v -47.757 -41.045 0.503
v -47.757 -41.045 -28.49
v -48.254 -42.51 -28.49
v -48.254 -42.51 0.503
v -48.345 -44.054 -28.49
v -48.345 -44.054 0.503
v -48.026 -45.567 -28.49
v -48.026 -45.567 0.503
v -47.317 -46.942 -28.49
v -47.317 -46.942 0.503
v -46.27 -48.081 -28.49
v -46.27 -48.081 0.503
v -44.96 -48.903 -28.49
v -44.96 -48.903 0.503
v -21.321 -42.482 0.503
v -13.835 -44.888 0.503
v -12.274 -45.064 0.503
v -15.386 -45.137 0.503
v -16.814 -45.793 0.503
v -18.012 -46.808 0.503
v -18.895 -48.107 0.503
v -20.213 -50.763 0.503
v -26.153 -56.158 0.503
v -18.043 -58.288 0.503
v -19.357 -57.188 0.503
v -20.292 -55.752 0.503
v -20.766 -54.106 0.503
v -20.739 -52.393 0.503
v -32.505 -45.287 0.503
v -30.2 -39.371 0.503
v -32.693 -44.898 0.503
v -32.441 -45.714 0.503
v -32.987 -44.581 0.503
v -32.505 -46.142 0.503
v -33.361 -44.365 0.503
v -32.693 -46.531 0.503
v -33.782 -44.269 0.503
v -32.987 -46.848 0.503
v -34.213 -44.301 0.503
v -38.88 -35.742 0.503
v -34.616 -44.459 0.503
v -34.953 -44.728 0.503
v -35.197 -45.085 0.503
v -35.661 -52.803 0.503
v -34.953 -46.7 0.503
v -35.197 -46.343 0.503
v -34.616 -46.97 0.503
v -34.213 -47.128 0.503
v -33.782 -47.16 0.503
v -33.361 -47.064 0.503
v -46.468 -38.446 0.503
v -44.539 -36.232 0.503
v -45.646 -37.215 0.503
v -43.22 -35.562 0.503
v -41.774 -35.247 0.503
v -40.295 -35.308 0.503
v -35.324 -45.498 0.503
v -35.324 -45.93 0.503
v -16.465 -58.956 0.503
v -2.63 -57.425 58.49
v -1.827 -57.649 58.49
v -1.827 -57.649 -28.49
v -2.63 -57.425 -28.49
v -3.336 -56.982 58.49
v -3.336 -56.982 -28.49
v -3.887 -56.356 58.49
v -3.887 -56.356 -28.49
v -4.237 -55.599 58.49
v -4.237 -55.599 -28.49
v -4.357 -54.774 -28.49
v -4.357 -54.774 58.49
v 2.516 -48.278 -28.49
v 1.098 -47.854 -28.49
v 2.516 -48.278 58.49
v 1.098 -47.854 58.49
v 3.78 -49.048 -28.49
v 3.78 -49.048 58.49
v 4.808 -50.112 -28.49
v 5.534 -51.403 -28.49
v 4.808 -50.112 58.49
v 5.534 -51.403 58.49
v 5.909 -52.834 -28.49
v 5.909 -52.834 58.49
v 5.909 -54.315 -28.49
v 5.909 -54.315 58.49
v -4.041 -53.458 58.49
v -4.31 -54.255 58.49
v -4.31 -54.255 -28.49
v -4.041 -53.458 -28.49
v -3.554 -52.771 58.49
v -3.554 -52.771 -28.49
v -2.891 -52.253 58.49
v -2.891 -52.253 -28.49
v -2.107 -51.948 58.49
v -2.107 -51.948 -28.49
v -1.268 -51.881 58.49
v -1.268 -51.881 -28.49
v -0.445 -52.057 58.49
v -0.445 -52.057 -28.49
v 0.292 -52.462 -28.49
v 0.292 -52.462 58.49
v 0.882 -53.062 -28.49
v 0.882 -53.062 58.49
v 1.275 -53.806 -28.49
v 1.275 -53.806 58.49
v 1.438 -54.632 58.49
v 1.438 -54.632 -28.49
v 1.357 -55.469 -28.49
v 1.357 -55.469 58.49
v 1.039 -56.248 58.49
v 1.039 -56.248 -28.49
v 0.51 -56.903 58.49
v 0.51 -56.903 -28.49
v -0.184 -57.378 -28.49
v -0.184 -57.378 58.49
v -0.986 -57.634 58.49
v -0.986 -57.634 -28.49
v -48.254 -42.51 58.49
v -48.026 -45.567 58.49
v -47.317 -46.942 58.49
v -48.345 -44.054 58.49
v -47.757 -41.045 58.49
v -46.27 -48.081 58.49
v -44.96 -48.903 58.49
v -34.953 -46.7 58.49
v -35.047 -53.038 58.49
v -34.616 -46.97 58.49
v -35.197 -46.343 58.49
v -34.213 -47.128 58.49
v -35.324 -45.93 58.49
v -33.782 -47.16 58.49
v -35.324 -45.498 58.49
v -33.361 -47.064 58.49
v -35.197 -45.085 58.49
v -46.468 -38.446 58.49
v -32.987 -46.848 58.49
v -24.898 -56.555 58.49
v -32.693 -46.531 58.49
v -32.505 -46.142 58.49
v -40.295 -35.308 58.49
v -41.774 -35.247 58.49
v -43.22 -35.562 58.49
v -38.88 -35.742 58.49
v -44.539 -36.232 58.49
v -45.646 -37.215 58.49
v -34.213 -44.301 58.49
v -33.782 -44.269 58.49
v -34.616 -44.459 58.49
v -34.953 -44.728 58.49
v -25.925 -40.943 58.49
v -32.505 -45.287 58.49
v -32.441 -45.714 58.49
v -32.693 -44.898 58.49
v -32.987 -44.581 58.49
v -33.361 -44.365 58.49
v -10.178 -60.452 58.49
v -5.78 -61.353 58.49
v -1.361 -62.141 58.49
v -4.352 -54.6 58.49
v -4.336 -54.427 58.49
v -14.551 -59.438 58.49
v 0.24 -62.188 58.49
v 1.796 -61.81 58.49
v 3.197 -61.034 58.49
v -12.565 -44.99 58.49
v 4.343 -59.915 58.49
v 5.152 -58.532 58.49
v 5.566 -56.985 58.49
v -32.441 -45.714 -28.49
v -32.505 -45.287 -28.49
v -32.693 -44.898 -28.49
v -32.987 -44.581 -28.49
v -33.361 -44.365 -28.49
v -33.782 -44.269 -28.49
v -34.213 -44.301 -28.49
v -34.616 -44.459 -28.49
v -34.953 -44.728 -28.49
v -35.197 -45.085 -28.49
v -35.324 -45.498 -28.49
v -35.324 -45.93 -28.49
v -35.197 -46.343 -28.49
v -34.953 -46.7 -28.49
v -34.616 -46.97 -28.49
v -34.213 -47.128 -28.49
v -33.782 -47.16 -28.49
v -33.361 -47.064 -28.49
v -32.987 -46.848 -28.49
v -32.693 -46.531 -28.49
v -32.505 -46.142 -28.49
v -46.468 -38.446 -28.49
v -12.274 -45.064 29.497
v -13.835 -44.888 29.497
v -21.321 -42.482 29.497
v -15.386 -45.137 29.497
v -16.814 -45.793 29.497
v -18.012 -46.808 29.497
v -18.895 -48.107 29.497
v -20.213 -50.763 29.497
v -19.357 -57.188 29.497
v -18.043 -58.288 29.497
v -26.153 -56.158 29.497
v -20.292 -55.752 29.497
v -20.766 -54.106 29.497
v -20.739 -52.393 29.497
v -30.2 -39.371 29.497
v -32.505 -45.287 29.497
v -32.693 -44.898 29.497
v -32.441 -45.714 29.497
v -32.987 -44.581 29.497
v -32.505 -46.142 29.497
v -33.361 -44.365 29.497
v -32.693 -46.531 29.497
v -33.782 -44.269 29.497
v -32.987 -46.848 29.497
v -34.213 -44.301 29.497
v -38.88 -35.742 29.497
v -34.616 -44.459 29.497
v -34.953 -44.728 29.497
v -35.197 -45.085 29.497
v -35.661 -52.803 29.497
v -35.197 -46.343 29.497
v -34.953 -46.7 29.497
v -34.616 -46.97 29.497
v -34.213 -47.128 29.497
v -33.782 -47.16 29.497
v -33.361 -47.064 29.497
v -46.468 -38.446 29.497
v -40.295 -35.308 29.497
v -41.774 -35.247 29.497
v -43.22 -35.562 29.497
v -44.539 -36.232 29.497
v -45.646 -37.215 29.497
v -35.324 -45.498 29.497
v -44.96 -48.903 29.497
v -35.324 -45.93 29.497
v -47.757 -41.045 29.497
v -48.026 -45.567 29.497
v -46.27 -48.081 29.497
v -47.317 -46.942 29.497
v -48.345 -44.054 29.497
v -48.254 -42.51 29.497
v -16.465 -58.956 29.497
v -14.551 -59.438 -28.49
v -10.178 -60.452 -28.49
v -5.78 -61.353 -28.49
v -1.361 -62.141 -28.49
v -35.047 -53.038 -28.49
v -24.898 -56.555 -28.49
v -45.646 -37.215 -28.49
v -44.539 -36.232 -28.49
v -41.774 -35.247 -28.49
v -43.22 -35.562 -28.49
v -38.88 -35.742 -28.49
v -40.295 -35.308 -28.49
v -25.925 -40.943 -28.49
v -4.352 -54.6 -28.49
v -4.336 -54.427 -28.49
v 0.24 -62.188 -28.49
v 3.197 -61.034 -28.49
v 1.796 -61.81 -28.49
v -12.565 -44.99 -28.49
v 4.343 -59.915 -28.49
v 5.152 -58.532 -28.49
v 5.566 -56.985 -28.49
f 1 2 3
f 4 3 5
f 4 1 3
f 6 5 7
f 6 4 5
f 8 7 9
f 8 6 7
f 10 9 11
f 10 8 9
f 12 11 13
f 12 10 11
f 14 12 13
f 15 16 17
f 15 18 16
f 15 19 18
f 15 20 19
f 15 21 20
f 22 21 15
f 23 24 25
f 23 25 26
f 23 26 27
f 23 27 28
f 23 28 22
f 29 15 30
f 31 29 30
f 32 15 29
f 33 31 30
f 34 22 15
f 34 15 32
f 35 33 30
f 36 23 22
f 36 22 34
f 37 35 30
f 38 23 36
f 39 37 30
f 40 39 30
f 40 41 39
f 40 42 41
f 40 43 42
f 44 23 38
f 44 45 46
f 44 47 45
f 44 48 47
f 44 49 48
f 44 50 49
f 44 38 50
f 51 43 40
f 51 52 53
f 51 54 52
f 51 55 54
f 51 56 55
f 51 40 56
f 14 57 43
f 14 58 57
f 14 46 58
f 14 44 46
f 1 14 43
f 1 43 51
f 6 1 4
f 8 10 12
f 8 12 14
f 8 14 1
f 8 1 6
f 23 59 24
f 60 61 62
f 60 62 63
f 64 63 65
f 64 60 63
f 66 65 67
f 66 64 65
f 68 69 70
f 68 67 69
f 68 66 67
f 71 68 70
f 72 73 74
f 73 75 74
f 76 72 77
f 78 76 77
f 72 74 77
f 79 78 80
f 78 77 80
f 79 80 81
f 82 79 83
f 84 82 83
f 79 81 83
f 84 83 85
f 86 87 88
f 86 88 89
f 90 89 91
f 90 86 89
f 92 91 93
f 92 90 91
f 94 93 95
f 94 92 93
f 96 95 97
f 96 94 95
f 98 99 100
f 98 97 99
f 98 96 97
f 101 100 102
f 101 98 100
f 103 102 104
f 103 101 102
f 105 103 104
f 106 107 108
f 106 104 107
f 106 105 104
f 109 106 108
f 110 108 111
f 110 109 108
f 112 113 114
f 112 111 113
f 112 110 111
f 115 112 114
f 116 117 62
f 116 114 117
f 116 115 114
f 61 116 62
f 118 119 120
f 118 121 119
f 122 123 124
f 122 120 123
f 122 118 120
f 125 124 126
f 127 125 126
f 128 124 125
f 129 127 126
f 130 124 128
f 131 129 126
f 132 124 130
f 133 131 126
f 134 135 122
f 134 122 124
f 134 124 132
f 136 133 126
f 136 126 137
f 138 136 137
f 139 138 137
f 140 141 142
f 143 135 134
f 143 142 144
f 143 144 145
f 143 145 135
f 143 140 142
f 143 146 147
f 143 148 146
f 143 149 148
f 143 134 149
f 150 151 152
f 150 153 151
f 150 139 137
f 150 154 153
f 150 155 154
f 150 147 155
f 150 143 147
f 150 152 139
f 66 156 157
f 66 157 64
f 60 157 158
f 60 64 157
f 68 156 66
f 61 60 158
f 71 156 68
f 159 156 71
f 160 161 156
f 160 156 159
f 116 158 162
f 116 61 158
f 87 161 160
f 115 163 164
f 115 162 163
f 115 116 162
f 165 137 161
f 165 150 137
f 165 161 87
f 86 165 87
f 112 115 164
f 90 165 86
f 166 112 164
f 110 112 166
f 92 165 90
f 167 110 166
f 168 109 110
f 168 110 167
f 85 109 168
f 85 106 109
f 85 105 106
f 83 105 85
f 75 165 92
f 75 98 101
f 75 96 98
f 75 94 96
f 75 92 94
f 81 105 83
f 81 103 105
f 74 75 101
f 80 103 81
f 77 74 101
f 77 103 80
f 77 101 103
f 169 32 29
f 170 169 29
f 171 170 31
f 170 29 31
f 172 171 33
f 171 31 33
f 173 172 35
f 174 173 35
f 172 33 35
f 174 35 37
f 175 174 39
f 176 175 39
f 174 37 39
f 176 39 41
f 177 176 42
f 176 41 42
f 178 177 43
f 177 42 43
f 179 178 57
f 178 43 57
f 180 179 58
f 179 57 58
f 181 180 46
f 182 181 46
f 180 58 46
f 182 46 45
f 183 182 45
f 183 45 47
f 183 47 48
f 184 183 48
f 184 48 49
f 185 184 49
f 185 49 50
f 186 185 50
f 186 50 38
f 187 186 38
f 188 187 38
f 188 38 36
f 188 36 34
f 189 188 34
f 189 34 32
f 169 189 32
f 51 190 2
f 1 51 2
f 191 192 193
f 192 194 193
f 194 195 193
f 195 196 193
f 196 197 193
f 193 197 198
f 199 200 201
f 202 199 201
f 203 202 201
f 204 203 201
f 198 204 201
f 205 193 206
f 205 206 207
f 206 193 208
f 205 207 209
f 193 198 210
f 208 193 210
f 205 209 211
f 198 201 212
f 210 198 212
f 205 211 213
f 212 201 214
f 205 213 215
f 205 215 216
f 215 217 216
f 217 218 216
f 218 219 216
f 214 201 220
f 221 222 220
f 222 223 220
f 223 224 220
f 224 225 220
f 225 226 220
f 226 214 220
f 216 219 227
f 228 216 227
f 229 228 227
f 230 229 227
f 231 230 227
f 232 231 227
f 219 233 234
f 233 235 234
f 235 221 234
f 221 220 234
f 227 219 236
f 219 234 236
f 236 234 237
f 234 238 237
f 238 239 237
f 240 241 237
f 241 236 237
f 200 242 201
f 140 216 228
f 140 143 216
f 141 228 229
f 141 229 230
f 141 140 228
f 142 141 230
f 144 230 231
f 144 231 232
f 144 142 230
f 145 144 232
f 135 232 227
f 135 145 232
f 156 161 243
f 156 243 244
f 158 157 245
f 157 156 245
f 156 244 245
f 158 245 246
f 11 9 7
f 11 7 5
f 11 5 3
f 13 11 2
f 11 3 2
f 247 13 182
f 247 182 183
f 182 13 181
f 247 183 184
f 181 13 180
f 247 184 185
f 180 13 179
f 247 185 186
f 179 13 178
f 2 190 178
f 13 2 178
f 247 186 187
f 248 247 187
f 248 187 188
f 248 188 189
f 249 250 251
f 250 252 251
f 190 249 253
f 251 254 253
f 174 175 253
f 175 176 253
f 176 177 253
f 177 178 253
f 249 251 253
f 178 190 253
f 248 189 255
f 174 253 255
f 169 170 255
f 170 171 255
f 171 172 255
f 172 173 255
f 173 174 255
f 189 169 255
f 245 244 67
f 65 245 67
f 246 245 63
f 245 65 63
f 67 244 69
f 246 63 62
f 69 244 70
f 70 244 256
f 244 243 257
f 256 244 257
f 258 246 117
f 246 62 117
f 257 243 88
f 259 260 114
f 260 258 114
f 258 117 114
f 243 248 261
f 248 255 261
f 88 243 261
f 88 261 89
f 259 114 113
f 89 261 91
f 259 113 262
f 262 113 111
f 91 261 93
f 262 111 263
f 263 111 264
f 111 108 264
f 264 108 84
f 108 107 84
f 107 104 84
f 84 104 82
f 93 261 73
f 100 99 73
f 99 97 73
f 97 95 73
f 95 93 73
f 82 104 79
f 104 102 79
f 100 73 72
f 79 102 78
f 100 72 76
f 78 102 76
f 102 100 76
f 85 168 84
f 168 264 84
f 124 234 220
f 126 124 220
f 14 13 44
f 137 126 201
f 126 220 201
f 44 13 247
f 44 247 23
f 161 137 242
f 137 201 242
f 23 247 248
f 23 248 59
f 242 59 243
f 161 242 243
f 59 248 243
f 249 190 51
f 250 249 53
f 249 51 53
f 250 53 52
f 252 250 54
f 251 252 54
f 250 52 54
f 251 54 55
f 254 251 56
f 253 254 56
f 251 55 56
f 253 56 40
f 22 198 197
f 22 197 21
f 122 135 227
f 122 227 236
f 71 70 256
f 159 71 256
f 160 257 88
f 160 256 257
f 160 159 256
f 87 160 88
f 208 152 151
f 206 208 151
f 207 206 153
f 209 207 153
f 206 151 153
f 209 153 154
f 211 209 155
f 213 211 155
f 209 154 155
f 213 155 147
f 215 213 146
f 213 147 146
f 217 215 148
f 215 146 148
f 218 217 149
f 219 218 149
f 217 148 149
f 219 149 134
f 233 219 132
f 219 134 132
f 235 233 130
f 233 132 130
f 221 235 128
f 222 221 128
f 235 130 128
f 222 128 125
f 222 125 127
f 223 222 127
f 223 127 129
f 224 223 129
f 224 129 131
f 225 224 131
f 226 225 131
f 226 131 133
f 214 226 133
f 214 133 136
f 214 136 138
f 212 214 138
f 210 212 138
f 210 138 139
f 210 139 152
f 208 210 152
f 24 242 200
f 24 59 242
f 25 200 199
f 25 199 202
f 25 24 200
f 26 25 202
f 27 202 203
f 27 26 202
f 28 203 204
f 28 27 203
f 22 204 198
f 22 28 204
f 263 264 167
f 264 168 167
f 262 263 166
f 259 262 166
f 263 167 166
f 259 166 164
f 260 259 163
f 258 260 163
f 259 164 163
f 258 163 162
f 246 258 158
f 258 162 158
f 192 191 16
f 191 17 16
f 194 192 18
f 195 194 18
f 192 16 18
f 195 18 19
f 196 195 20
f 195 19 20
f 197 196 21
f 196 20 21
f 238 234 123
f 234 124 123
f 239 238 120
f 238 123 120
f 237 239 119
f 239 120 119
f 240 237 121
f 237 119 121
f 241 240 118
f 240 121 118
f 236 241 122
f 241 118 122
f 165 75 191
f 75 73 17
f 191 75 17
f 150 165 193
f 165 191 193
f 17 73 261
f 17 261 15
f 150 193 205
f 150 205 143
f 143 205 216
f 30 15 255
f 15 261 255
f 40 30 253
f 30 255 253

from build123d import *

# Parameters (mm, degrees)
BOSS_EXTRUDE1_DEPTH     = 30
SKETCH2_W               = 10
SKETCH2_H               = 10
CUT_EXTRUDE2_DEPTH      = 37.330733855
SKETCH3_R               = 0.5
CUT_EXTRUDE3_DEPTH      = 30
FILLET1_R               = 2
SKETCH4_W               = 30
SKETCH4_H               = 5
BOSS_EXTRUDE2_DEPTH     = 10
FILLET2_R               = 2
FILLET3_R               = 2
CUT_EXTRUDE4_DEPTH      = 80.110177146
SKETCH6_W               = 10
SKETCH6_H               = 6
SKETCH8_W               = 10
SKETCH8_H               = 2.121165988
CUT_EXTRUDE5_DEPTH      = 80.110177146
FILLET4_R               = 8
CUT_EXTRUDE6_DEPTH      = 80.110177146
CUT_EXTRUDE6_DEPTH_BACK = 50
SCALE1_SCALE            = 1.9329
SCALE2_SCALE            = 1.5
CUT_EXTRUDE7_DEPTH      = 134.461525953
CUT_EXTRUDE7_DEPTH_BACK = 134.461525953
SKETCH10_R              = 280.344567012
SKETCH10_R_2            = 173.961
FILLET5_R               = 6


with BuildPart() as part:
    # Sketch1 → Boss-Extrude1 (new body)
    with BuildSketch(Plane.XY):
        with BuildLine():
            Line((-24.447759697, -49.267707941), (-26.670283306, -53.746590482))
            ThreePointArc((-26.670283306, -53.746590482), (-17.396934794, -57.422527459), (-7.642718065, -59.511249866))
            Line((-7.642718065, -59.511249866), (-7.005824893, -54.551979044))
            ThreePointArc((-7.005824893, -54.551979044), (-15.947190228, -52.637316837), (-24.447759697, -49.267707941))
        make_face()
    extrude(amount=BOSS_EXTRUDE1_DEPTH)

    # Sketch2 → Cut-Extrude2 (cut, through all)
    with BuildSketch(Plane(origin=(-26.670283306, -53.746590482, 0), x_dir=(0, 0, -1), z_dir=(0.4445047217595844, 0.8957765080272169, 0))):
        with Locations((-15, -5)):
            Rectangle(SKETCH2_W, SKETCH2_H)
    extrude(amount=CUT_EXTRUDE2_DEPTH, mode=Mode.SUBTRACT)

    # Sketch3 → Cut-Extrude3 (cut)
    with BuildSketch(Plane.XY.offset(30)):
        with Locations((-20.983324138, -53.534569281)):
            Circle(SKETCH3_R)
    extrude(amount=-CUT_EXTRUDE3_DEPTH, mode=Mode.SUBTRACT)

    # Fillet1
    fillet1_edges = [part.edges().sort_by_distance(p)[0] for p in [
        (-26.670283306, -53.746590482, 5),
        (-24.447759697, -49.267707941, 5),
        (-15.082503417, -52.891569183, 15),
        (-17.339488899, -57.439900111, 15),
        (-26.670283306, -53.746590482, 25),
        (-24.447759697, -49.267707941, 25),
    ]]
    fillet(fillet1_edges, radius=FILLET1_R)

    # Sketch4 → Boss-Extrude2 (add)
    with BuildSketch(Plane(origin=(-7.515339431, -58.519395701, 0), x_dir=(0, 0, -1), z_dir=(-0.12737863441697944, -0.9918541644284535, 0))):
        with Locations((-15, -2.5)):
            Rectangle(SKETCH4_W, SKETCH4_H)
    extrude(amount=BOSS_EXTRUDE2_DEPTH)

    # Fillet2
    fillet2_edges = [part.edges().sort_by_distance(p)[0] for p in [
        (-12.575405439, -58.667360415, 15),
    ]]
    fillet(fillet2_edges, radius=FILLET2_R)

    # Fillet3
    fillet3_edges = [part.edges().sort_by_distance(p)[0] for p in [
        (-7.005824893, -54.551979044, 15),
    ]]
    fillet(fillet3_edges, radius=FILLET3_R)

    # Sketch5 → Cut-Extrude4 (cut, through all)
    with BuildSketch(Plane.XY.offset(30)):
        with BuildLine():
            ThreePointArc((-10.9503146, -65.639855348), (-11.509930999, -66.072093113), (-11.077693234, -66.631709513))
            Line((-11.077693234, -66.631709513), (-10.9503146, -65.639855348))
        make_face()
        with BuildLine():
            Line((-10.9503146, -65.639855348), (-11.077693234, -66.631709513))
            ThreePointArc((-11.077693234, -66.631709513), (-10.683734829, -66.51117866), (-10.514003917, -66.135782431))
            ThreePointArc((-10.514003917, -66.135782431), (-10.638607687, -65.805513342), (-10.9503146, -65.639855348))
        make_face()
    extrude(amount=-CUT_EXTRUDE4_DEPTH, mode=Mode.SUBTRACT)

    # Cut-Sweep1: sweep along a path in Sketch7
    with BuildLine(Plane.XY) as cut_sweep1_path:
        Line((-8.024853968, -62.486812359), (-12.806249613, -60.46486559))
    # Sketch6 → Cut-Sweep1 (sweep, cut)
    with BuildSketch(Plane(origin=(0, 0, 0), x_dir=(0, 0, -1), z_dir=(0.9918541644284535, -0.1273786344169795, 0))):
        with Locations((-15, -66)):
            Rectangle(SKETCH6_W, SKETCH6_H)
    sweep(path=cut_sweep1_path.line, mode=Mode.SUBTRACT)

    # Sketch8 → Cut-Extrude5 (cut, through all)
    with BuildSketch(Plane(origin=(0, 0, 0), x_dir=(0, 0, -1), z_dir=(0.9918541644284535, -0.1273786344169795, 0))):
        with Locations((-15, -67.939417006)):
            Rectangle(SKETCH8_W, SKETCH8_H)
    extrude(amount=-CUT_EXTRUDE5_DEPTH, mode=Mode.SUBTRACT)

    # Fillet4
    fillet4_edges = [part.edges().sort_by_distance(p)[0] for p in [
        (-12.806249613, -60.46486559, 15),
    ]]
    fillet(fillet4_edges, radius=FILLET4_R)

    # Sketch9 → Cut-Extrude6 (cut, two sides: drawn at the far end of the back side and taken through both)
    with BuildSketch(Plane(origin=(0, 0, 0), x_dir=(-1, 0, 0), z_dir=(0, 0, -1)).offset(-CUT_EXTRUDE6_DEPTH_BACK)):
        with BuildLine():
            ThreePointArc((10.780840063, -56.480292913), (8.989884423, -56.068817625), (9.924359498, -57.651091416))
            Line((9.924359498, -57.651091416), (9.796980863, -56.659237252))
            ThreePointArc((9.796980863, -56.659237252), (10.28929948, -56.571903947), (10.780840063, -56.480292913))
        make_face()
        with BuildLine():
            Line((9.796980863, -56.659237252), (9.924359498, -57.651091416))
            ThreePointArc((9.924359498, -57.651091416), (10.547773323, -57.319775428), (10.796980863, -56.659237252))
            ThreePointArc((10.796980863, -56.659237252), (10.792937489, -56.569401844), (10.780840063, -56.480292913))
            ThreePointArc((10.780840063, -56.480292913), (10.28929948, -56.571903947), (9.796980863, -56.659237252))
        make_face()
    extrude(amount=CUT_EXTRUDE6_DEPTH + CUT_EXTRUDE6_DEPTH_BACK, mode=Mode.SUBTRACT)


with BuildPart() as part_1:
    # Scale1: scaled about (-14.187636467, -57.651950404, 15)
    add(part.part.scale(SCALE1_SCALE).moved(Location((13.23564606, 53.783504532, -13.9935))))


with BuildPart() as part_2:
    # Scale2: scaled about (-14.187636468, -57.651950404, 15)
    add(part_1.part.scale(SCALE2_SCALE).moved(Location((7.093818234, 28.825975202, -7.5))))

    # Sketch10 → Cut-Extrude7 (cut, two sides: drawn at the far end of the back side and taken through both)
    with BuildSketch(Plane.XY.offset(58.49025).offset(-CUT_EXTRUDE7_DEPTH_BACK)):
        with Locations((26.947287324, 109.501231999)):
            Circle(SKETCH10_R)
        with Locations((26.947287324, 109.501231999)):
            Circle(SKETCH10_R_2, mode=Mode.SUBTRACT)
    extrude(amount=CUT_EXTRUDE7_DEPTH + CUT_EXTRUDE7_DEPTH_BACK, mode=Mode.SUBTRACT)

    # Fillet5
    fillet5_edges = [part_2.edges().sort_by_distance(p)[0] for p in [
        (4.788372702, -63.042710299, 15),
    ]]
    fillet(fillet5_edges, radius=FILLET5_R)


solid = part_2.part
